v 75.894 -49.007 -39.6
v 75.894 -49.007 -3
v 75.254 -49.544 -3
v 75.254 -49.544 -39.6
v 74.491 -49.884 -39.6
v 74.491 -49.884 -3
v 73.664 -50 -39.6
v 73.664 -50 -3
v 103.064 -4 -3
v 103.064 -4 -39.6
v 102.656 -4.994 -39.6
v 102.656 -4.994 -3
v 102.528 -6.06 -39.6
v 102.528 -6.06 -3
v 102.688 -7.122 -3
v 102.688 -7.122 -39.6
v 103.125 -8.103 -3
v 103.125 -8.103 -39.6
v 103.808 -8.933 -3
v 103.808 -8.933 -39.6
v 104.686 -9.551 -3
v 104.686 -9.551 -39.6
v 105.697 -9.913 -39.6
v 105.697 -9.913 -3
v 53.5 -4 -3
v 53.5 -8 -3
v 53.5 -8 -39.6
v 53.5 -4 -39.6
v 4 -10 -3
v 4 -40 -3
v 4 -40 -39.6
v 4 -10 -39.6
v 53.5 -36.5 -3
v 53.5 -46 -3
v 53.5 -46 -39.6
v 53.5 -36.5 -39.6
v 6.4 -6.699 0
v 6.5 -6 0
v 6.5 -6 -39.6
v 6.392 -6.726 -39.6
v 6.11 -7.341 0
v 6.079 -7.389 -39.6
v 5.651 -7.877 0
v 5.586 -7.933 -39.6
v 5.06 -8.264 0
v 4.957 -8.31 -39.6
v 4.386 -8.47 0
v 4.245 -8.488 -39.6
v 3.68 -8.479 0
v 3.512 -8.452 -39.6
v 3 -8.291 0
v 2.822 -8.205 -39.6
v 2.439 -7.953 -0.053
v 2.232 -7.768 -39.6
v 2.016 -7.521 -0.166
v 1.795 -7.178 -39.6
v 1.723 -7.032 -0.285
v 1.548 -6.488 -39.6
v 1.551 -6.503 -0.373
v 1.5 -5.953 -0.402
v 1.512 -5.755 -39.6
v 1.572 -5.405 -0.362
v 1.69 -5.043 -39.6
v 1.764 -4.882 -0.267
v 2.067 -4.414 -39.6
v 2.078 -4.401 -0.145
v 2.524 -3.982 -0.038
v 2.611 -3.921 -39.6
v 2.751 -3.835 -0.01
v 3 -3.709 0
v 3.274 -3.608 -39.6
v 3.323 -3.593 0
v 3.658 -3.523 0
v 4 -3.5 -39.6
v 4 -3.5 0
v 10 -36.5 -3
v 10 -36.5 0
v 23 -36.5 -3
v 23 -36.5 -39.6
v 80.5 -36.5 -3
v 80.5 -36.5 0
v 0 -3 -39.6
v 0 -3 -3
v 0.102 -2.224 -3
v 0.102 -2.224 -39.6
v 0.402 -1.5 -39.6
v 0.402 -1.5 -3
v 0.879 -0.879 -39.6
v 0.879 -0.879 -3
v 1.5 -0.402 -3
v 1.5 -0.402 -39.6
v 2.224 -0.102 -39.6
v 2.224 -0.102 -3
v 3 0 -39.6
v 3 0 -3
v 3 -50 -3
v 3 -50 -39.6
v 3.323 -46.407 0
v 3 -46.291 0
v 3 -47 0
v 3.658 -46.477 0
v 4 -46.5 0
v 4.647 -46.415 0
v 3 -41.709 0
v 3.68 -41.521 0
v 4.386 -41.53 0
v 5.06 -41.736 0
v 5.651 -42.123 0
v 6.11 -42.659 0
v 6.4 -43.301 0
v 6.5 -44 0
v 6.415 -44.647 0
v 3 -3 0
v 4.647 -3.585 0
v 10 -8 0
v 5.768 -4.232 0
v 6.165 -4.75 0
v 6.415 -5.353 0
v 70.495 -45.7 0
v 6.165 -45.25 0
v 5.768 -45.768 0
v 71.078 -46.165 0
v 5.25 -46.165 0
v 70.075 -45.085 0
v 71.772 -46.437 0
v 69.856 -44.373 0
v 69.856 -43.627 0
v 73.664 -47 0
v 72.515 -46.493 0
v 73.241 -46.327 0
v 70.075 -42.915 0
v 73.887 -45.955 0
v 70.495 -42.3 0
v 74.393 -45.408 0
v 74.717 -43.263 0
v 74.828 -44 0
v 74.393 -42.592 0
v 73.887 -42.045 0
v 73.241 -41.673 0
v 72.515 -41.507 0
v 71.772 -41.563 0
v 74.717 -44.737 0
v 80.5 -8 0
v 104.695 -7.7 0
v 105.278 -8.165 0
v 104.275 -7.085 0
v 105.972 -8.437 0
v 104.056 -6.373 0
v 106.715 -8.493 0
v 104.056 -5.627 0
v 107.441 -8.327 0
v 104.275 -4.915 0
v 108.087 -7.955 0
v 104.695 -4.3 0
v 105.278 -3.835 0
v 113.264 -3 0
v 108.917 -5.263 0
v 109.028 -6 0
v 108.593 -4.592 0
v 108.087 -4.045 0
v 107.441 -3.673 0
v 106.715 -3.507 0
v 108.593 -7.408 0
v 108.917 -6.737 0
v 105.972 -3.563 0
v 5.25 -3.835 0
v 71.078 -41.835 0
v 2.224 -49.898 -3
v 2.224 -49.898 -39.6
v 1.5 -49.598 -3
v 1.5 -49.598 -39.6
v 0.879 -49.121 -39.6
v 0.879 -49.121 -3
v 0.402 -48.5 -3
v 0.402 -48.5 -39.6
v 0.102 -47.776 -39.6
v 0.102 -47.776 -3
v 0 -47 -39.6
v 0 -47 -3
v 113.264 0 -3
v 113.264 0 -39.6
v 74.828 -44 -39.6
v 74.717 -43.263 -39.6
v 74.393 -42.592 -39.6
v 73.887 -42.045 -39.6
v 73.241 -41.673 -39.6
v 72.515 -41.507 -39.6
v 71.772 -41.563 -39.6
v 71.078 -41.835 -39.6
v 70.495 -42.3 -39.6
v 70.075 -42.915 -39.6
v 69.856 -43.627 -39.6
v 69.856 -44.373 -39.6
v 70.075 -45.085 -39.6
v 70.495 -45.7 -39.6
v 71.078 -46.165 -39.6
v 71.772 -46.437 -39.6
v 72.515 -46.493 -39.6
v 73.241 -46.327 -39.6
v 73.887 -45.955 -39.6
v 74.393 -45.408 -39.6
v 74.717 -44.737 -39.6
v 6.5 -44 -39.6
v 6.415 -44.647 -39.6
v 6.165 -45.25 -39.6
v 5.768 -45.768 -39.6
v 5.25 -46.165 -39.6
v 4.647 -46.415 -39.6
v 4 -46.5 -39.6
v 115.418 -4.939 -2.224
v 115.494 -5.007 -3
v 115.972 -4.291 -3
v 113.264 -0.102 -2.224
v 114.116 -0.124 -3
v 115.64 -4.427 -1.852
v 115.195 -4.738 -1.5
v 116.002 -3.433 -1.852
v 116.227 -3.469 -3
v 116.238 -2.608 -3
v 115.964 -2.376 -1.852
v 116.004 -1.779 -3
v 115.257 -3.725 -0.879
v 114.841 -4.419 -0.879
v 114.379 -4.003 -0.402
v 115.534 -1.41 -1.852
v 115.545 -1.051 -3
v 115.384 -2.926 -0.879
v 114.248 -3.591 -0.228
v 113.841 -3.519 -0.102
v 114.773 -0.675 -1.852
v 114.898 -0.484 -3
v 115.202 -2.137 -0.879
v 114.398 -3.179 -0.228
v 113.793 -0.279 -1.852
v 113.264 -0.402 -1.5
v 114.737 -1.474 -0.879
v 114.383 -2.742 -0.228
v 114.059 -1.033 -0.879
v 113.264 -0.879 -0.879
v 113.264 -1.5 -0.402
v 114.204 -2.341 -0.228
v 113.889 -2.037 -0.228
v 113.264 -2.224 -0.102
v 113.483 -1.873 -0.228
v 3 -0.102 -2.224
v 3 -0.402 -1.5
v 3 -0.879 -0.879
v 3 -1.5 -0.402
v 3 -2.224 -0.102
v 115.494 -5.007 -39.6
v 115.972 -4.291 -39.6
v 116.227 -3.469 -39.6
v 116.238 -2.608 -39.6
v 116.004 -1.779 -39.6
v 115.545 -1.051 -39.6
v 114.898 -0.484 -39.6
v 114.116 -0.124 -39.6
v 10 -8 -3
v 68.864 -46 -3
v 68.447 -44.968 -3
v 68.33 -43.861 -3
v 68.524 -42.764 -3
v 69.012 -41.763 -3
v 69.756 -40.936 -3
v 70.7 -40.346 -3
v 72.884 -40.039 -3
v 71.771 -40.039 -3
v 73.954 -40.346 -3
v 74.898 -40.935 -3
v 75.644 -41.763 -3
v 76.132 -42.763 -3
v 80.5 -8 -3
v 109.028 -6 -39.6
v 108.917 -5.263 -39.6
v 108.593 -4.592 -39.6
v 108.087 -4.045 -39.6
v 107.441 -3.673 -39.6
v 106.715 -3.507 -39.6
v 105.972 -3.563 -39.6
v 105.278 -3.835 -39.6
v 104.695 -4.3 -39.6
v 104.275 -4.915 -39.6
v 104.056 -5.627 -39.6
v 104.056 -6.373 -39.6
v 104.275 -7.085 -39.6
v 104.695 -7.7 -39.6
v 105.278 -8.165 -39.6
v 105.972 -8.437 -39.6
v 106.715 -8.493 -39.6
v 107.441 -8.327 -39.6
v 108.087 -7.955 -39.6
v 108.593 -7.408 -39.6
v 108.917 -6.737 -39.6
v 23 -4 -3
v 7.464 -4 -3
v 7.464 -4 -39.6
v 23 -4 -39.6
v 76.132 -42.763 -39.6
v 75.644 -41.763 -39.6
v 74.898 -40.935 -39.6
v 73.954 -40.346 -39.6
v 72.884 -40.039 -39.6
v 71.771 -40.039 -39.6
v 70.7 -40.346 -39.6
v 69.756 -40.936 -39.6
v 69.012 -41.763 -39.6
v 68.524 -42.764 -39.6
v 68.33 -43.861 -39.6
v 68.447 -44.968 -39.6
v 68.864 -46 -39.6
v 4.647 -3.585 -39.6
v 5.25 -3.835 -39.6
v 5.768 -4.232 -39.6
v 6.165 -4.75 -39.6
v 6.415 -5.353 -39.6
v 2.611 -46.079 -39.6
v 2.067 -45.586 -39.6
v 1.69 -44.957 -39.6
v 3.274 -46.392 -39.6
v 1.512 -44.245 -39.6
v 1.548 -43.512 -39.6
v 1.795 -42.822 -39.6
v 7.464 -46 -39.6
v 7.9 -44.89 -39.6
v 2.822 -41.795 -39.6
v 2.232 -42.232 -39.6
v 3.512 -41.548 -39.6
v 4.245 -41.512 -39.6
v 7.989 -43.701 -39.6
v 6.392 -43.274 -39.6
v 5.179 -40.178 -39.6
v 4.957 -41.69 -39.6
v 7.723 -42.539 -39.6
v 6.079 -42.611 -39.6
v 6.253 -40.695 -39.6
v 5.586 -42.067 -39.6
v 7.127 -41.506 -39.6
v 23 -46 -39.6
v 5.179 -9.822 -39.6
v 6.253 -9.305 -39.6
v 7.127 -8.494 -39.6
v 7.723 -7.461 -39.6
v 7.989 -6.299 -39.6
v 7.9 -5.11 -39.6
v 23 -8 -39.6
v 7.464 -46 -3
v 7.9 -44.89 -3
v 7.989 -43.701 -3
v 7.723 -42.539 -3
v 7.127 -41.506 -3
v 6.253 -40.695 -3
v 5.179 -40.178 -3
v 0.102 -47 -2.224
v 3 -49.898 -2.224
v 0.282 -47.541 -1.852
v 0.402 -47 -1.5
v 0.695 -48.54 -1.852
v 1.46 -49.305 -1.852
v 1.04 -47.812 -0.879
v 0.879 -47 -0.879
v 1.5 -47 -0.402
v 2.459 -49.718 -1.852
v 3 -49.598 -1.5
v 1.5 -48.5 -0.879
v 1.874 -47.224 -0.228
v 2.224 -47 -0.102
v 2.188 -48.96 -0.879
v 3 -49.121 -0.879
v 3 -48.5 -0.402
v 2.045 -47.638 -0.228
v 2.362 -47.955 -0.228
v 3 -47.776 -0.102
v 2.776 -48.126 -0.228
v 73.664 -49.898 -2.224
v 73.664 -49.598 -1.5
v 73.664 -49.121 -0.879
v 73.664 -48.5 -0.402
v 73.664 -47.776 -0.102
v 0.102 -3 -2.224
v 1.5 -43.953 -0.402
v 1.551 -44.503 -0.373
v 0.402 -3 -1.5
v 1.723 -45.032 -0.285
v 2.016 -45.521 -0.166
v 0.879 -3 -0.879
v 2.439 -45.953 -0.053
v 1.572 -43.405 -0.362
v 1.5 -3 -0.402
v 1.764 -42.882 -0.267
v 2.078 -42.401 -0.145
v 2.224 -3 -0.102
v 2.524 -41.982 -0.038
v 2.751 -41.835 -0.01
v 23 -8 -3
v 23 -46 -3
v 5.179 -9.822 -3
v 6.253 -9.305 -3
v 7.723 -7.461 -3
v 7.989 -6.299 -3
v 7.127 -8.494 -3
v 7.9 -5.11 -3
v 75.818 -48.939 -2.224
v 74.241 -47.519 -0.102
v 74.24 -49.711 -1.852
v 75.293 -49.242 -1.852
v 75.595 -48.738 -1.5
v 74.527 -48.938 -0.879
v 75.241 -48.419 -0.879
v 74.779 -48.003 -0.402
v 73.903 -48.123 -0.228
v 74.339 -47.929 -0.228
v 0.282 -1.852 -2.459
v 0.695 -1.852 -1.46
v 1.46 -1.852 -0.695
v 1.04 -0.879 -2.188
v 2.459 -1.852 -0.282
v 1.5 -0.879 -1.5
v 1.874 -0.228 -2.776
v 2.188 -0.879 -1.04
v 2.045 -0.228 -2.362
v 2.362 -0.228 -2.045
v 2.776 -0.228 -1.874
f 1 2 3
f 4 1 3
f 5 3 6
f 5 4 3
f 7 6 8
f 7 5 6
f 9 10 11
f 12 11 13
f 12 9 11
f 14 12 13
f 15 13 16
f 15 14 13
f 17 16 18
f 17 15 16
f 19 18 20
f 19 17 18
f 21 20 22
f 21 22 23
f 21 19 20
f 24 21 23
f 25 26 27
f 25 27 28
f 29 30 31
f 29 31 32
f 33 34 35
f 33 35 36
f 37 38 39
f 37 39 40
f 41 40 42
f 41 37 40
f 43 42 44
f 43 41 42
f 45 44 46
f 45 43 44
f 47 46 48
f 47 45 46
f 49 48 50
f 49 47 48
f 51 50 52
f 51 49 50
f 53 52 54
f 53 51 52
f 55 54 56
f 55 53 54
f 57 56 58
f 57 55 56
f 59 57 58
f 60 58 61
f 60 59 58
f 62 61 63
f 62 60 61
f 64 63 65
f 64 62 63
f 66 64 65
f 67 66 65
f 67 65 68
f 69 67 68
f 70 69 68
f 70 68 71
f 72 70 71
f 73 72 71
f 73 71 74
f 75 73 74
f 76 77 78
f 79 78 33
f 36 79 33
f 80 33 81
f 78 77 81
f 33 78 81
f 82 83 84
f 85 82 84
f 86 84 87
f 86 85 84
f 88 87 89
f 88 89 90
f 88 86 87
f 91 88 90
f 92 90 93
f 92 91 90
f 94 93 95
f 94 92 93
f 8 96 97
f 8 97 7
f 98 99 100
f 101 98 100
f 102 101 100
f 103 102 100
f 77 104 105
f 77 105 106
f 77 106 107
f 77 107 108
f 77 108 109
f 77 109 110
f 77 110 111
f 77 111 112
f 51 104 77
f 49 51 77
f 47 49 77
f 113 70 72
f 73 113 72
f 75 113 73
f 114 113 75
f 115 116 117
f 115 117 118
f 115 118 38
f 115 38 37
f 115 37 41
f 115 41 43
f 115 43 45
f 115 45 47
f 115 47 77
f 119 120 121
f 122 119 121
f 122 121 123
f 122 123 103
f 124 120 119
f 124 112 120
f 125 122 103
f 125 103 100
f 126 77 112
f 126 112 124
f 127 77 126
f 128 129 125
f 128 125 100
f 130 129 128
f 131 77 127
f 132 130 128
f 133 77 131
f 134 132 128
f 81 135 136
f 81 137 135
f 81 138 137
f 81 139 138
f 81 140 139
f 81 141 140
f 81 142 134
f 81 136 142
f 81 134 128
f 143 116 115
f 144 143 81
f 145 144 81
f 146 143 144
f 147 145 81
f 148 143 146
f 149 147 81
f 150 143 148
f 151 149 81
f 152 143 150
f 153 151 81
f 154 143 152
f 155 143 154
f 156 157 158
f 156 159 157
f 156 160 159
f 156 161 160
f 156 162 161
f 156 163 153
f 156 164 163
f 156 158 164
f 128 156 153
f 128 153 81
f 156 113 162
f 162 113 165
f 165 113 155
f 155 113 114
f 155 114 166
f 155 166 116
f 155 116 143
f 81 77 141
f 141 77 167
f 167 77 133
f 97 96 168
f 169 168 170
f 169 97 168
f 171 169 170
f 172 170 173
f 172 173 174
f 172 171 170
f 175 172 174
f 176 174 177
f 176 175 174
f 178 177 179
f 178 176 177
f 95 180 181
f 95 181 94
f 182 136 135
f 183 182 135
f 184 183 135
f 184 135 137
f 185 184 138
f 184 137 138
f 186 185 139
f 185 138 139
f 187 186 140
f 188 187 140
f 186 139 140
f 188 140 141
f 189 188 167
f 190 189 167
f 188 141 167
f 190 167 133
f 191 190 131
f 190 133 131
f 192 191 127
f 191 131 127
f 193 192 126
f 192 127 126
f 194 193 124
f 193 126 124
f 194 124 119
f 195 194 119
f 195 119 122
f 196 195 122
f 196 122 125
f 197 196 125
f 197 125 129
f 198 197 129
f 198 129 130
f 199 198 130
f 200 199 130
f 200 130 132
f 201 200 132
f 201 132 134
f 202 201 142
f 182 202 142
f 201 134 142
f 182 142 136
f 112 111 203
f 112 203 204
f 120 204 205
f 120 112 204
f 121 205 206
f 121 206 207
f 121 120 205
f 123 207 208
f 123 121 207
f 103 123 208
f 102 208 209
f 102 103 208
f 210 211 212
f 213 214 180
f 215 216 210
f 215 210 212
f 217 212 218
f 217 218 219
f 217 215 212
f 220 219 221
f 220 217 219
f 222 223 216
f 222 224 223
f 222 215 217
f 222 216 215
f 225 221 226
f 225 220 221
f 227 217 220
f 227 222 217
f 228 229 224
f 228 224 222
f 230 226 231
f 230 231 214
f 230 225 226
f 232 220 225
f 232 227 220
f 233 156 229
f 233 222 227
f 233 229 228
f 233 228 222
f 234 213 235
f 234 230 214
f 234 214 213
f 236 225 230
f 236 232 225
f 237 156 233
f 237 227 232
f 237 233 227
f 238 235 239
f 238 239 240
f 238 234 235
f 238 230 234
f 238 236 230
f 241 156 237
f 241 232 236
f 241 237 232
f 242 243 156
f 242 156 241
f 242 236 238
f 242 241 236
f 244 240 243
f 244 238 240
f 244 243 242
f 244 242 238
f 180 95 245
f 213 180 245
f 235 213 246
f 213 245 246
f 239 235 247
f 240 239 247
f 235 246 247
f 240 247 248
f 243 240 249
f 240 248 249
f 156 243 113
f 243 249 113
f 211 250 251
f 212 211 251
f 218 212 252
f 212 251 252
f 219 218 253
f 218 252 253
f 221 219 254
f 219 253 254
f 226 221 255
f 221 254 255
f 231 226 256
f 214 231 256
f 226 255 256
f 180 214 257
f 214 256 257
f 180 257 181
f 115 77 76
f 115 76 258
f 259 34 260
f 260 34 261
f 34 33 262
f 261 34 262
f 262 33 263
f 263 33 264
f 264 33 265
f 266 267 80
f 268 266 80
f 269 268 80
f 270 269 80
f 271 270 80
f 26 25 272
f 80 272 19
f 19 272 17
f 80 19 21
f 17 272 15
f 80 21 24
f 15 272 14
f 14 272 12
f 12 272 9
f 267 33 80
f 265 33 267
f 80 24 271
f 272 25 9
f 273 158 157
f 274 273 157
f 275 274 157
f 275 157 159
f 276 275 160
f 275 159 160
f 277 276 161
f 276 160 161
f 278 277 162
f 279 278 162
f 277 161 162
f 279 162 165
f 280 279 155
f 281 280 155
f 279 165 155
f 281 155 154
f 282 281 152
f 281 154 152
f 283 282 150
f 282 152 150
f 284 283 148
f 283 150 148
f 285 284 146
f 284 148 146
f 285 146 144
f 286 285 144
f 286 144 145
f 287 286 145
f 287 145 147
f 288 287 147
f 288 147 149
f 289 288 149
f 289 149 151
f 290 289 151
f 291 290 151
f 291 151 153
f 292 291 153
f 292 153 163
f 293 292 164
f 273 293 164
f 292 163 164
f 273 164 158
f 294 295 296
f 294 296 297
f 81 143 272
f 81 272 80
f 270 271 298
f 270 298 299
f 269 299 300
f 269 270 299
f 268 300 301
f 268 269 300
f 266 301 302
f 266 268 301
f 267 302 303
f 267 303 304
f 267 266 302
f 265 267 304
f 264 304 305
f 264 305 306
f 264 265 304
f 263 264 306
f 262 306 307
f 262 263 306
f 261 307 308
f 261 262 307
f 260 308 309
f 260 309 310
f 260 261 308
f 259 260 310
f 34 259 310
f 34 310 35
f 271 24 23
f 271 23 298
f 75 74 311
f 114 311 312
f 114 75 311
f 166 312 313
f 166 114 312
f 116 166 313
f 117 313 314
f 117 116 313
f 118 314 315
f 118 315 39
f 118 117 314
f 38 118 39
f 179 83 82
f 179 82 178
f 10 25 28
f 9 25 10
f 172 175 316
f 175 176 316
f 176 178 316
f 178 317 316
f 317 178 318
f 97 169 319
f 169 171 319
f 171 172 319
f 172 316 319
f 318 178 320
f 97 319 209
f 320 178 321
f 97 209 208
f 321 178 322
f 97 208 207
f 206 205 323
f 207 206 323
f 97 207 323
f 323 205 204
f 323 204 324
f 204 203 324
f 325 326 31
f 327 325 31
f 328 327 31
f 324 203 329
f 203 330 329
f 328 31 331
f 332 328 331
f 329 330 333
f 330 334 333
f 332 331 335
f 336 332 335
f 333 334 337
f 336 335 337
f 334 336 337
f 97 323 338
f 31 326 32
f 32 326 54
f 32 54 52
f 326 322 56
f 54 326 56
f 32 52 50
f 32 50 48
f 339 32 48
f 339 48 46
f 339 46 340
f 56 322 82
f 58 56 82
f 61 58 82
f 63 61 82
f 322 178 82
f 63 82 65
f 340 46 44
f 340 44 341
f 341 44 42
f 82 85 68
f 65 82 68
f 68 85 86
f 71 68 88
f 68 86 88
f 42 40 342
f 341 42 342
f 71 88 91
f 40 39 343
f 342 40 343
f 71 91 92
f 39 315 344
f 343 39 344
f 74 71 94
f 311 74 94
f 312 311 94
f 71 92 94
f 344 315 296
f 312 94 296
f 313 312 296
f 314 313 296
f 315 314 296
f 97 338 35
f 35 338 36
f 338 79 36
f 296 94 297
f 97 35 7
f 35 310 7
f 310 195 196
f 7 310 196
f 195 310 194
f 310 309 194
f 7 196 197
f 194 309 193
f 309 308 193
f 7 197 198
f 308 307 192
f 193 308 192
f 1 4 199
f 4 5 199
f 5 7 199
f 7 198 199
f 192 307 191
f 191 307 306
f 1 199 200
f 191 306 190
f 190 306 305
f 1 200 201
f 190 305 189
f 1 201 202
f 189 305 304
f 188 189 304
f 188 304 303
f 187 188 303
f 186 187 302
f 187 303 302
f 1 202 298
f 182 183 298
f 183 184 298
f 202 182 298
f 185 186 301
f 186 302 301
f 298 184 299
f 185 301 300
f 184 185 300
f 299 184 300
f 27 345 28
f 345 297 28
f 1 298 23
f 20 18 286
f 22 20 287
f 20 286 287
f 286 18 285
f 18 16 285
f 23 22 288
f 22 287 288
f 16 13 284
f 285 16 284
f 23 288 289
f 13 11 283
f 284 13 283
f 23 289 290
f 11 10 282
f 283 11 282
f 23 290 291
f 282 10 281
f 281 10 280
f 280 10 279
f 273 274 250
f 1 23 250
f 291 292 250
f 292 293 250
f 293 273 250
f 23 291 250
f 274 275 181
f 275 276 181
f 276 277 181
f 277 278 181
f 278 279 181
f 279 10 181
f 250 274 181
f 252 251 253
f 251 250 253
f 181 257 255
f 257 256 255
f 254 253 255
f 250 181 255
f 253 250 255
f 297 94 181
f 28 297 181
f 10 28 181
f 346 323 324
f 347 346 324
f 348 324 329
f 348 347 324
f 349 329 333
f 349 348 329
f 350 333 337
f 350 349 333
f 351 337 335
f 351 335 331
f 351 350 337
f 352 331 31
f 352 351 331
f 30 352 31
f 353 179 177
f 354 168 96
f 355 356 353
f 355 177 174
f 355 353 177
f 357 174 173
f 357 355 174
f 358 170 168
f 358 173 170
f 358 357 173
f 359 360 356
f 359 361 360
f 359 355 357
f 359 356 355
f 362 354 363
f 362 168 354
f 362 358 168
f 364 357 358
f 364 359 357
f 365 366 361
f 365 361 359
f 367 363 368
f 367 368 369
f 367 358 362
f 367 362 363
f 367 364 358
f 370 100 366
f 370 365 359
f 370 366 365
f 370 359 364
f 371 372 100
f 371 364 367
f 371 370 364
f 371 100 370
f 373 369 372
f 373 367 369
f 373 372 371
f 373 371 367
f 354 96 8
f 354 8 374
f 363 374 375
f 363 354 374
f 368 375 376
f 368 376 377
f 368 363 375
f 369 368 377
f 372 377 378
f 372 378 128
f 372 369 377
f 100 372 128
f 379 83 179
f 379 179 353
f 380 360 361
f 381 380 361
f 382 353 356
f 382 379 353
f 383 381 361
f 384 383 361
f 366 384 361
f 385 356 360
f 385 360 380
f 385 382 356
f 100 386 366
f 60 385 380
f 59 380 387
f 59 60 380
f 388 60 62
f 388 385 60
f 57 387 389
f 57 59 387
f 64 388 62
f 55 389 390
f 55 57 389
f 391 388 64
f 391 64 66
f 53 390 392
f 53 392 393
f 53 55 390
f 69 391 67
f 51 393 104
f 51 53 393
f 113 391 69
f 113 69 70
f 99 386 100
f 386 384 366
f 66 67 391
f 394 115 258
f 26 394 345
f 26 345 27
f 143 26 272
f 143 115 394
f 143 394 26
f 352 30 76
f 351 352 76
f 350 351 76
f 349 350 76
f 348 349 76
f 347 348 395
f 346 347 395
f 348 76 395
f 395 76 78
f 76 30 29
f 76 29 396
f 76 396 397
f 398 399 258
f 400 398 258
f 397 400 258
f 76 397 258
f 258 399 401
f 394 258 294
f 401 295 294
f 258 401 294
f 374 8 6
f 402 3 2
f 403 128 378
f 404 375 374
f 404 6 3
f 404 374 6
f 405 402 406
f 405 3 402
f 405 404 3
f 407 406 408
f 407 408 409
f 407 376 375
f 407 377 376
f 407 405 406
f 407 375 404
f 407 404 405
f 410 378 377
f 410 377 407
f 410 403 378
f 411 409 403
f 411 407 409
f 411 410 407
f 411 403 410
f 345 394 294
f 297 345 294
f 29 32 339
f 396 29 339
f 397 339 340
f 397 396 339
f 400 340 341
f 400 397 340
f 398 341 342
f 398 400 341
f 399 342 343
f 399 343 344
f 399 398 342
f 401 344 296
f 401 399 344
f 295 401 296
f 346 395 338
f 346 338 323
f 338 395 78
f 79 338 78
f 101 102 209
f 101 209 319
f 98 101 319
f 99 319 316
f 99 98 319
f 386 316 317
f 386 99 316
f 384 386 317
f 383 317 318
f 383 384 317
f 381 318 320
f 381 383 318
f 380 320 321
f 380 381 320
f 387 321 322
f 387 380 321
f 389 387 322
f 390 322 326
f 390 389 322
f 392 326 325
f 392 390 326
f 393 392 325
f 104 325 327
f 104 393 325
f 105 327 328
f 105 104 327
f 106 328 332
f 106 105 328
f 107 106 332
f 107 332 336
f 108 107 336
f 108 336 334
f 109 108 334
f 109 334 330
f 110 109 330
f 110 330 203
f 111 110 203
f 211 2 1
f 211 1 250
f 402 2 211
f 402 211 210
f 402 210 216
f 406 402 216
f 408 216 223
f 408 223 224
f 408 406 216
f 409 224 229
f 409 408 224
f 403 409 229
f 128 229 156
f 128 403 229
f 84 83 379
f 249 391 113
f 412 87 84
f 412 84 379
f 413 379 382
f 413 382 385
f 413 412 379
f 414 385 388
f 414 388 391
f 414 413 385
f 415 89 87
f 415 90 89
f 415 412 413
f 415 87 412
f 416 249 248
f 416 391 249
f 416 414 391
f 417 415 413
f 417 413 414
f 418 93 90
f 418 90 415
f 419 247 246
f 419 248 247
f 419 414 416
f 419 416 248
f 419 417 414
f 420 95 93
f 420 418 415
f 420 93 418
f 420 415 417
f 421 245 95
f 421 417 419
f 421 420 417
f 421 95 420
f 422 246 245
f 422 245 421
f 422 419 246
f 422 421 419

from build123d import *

# Parameters (mm, degrees)
F1_DEPTH     = 3
F0_R         = 2.5
F0_W         = 30.5
F0_H         = 9.5
F0_H_2       = 4
F2_DEPTH     = 39.6
F3_T1_DEPTH  = 70.6639127859
F3_T3_DEPTH  = 44.1
F3_T5_DEPTH  = 39.9402180353
F3_T7_DEPTH  = 59.1959458071
F3_T9_DEPTH  = 53.4402180353
F3_T11_DEPTH = 110.2639127859
F3_T13_DEPTH = 44
F3_S17_W     = 3
F3_S17_H     = 3
F3_T18_DEPTH = 3
F3_T24_DEPTH = 3
F3_T30_DEPTH = 3
F3_S35_W     = 3
F3_S35_H     = 3
F3_T36_DEPTH = 3


# Not quite as in the source:
# - a fillet or chamfer that OpenCascade refuses, or shapes differently, is made with other operations: its cross-section is extruded or revolved along the edge and cut away or added


with BuildPart() as f1:
    # F0 (on Top) → F1 (new body)
    with BuildSketch(Plane.XY):
        with BuildLine():
            Line((10, -36.5), (10, -8))
            Line((10, -8), (23, -8))
            Line((23, -8), (23, -4))
            Line((23, -4), (7.4641016151, -4))
            ThreePointArc((7.4641016151, -4), (7.4641016151, -8), (4, -10))
            Line((4, -10), (4, -40))
            ThreePointArc((4, -40), (7.4641016151, -42), (7.4641016151, -46))
            Line((7.4641016151, -46), (23, -46))
            Line((23, -46), (23, -36.5))
            Line((23, -36.5), (10, -36.5))
        make_face()
    extrude(amount=-F1_DEPTH)



with BuildPart() as f1b:
    # F0 (on Top) → F1, piece 2 (new body)
    with BuildSketch(Plane.XY):
        with BuildLine():
            Line((53.5, -4), (53.5, -8))
            Line((53.5, -8), (80.5, -8))
            Line((80.5, -8), (80.5, -36.5))
            Line((80.5, -36.5), (53.5, -36.5))
            Line((53.5, -36.5), (53.5, -46))
            Line((53.5, -46), (68.8637239566, -46))
            ThreePointArc((68.8637239566, -46), (70.700471232, -40.3459997464), (76.1317756715, -42.7630830107))
            Line((76.1317756715, -42.7630830107), (105.697052057, -9.9127759158))
            ThreePointArc((105.697052057, -9.9127759158), (102.8738253182, -7.6273543397), (103.0637239566, -4))
            Line((103.0637239566, -4), (53.5, -4))
        make_face()
    extrude(amount=-F1_DEPTH)


with BuildPart() as f1_1:
    add(f1.part)

    add(f1b.part)  # F2 merges F1b
    # F0 (on Top) → F2 (join)
    with BuildSketch(Plane.XY):
        Polygon((120, 0), (0, 0), (0, -50), (75, -50), align=None)
        with BuildLine():
            ThreePointArc((4, -46.5), (2.232233047, -42.232233047), (6.5, -44))
            ThreePointArc((6.5, -44), (5.767766953, -45.767766953), (4, -46.5))
        make_face(mode=Mode.SUBTRACT)
        with BuildLine():
            Line((7.4641016151, -4), (23, -4))
            Line((23, -4), (53.5, -4))
            Line((53.5, -4), (103.0637239566, -4))
            ThreePointArc((103.0637239566, -4), (102.8738253182, -7.6273543397), (105.697052057, -9.9127759158))
            Line((105.697052057, -9.9127759158), (76.1317756715, -42.7630830107))
            ThreePointArc((76.1317756715, -42.7630830107), (70.700471232, -40.3459997464), (68.8637239566, -46))
            Line((68.8637239566, -46), (53.5, -46))
            Line((53.5, -46), (23, -46))
            Line((23, -46), (7.4641016151, -46))
            ThreePointArc((7.4641016151, -46), (7.4641016151, -42), (4, -40))
            Line((4, -40), (4, -10))
            ThreePointArc((4, -10), (7.4641016151, -8), (7.4641016151, -4))
        make_face(mode=Mode.SUBTRACT)
        with Locations((72.3278255718, -44)):
            Circle(F0_R, mode=Mode.SUBTRACT)
        with BuildLine():
            ThreePointArc((4, -3.5), (5.767766953, -4.232233047), (6.5, -6))
            ThreePointArc((6.5, -6), (2.232233047, -7.767766953), (4, -3.5))
        make_face(mode=Mode.SUBTRACT)
        with Locations((106.5278255718, -6)):
            Circle(F0_R, mode=Mode.SUBTRACT)
        with Locations((38.25, -41.25)):
            Rectangle(F0_W, F0_H)
        with Locations((38.25, -6)):
            Rectangle(F0_W, F0_H_2)
    extrude(amount=-F2_DEPTH)

    # F3: fillet of radius 3 on 8 edges, made by hand

    # F3_s2 → F3_t1 (cut)
    with BuildSketch(Plane.YZ.offset(3)):
        with BuildLine():
            ThreePointArc((-50, -3), (-49.1213203436, -0.8786796564), (-47, 0))
            Line((-47, 0), (-50, 0))
            Line((-50, 0), (-50, -3))
        make_face()
    extrude(amount=F3_T1_DEPTH, mode=Mode.SUBTRACT)

    # F3_s4 → F3_t3 (cut)
    with BuildSketch(Plane.XY.offset(-47.1)):
        with BuildLine():
            ThreePointArc((3, -50), (0.8786796564, -49.1213203436), (0, -47))
            Line((0, -47), (0, -50))
            Line((0, -50), (3, -50))
        make_face()
        with BuildLine():
            ThreePointArc((0, -3), (0.8786796564, -0.8786796564), (3, 0))
            Line((3, 0), (0, 0))
            Line((0, 0), (0, -3))
        make_face()
    extrude(amount=F3_T3_DEPTH, mode=Mode.SUBTRACT)

    # F3_s6 → F3_t5 (cut)
    with BuildSketch(Plane.XY.offset(-42.9402180353)):
        with BuildLine():
            ThreePointArc((75.8937952246, -49.0068941949), (74.8844285407, -49.7405001902), (73.6639127859, -50))
            Line((73.6639127859, -50), (75, -50))
            Line((75, -50), (75.8937952246, -49.0068941949))
        make_face()
    extrude(amount=F3_T5_DEPTH, mode=Mode.SUBTRACT)

    # F3_s8 → F3_t7 (cut)
    with BuildSketch(Plane(origin=(9.5954526832, 10.6616140924, 0), x_dir=(0, 0, 1), z_dir=(0.6689647316, 0.7432941462, 0))):
        with BuildLine():
            ThreePointArc((-3, 89.1952975497), (-0.8786796564, 88.3166178932), (0, 86.1952975497))
            Line((0, 86.1952975497), (0, 89.1952975497))
            Line((0, 89.1952975497), (-3, 89.1952975497))
        make_face()
    extrude(amount=F3_T7_DEPTH, mode=Mode.SUBTRACT)

    # F3_s10 → F3_t9 (cut)
    with BuildSketch(Plane.XY.offset(-56.4402180353)):
        with BuildLine():
            ThreePointArc((115.4937952246, -5.0068941949), (116.004412976, -1.7794842452), (113.2639127859, 0))
            Line((113.2639127859, 0), (120, 0))
            Line((120, 0), (115.4937952246, -5.0068941949))
        make_face()
    extrude(amount=F3_T9_DEPTH, mode=Mode.SUBTRACT)

    # F3_s12 → F3_t11 (cut)
    with BuildSketch(Plane.YZ.offset(3)):
        with BuildLine():
            ThreePointArc((0, -3), (-0.8786796564, -0.8786796564), (-3, 0))
            Line((-3, 0), (0, 0))
            Line((0, 0), (0, -3))
        make_face()
    extrude(amount=F3_T11_DEPTH, mode=Mode.SUBTRACT)

    # F3_s14 → F3_t13 (cut)
    with BuildSketch(Plane.XZ.offset(3)):
        with BuildLine():
            ThreePointArc((0, -3), (0.8786796564, -0.8786796564), (3, 0))
            Line((3, 0), (0, 0))
            Line((0, 0), (0, -3))
        make_face()
    extrude(amount=F3_T13_DEPTH, mode=Mode.SUBTRACT)


with BuildPart() as f3_tool16:
    # F3_s17 → F3_t18 (new body)
    with BuildSketch(Plane.XY.offset(-3)):
        with Locations((1.5, -48.5)):
            Rectangle(F3_S17_W, F3_S17_H)
    extrude(amount=F3_T18_DEPTH)

    # F3_s19 → F3_t20 (revolve, cut)
    with BuildSketch(Plane(origin=(3, -47, -3), x_dir=(0.7071067812, 0.7071067812, 0), z_dir=(0.7071067812, -0.7071067812, 0))):
        with BuildLine():
            ThreePointArc((0, -3), (3, 0), (0, 3))
            Line((0, 3), (0, -3))
        make_face()
    revolve(axis=Axis((3, -47, -3), (0, 0, 1)), mode=Mode.SUBTRACT)


with BuildPart() as f1_2:
    add(f1_1.part)

    # F3_t15: cut F3_tool16
    add(f3_tool16.part, mode=Mode.SUBTRACT)


with BuildPart() as f3_tool22:
    # F3_s23 → F3_t24 (new body)
    with BuildSketch(Plane.XY.offset(-3)):
        Polygon((73.6639127859, -47), (75.8937952246, -49.0068941949), (75, -50), (73.6639127859, -50), align=None)
    extrude(amount=F3_T24_DEPTH)

    # F3_s25 → F3_t26 (revolve, cut)
    with BuildSketch(Plane(origin=(73.6639127859, -47, -3), x_dir=(-0.4068385849, 0.9135000634, 0), z_dir=(0.9135000634, 0.4068385849, 0))):
        with BuildLine():
            ThreePointArc((0, -3), (3, 0), (0, 3))
            Line((0, 3), (0, -3))
        make_face()
    revolve(axis=Axis((73.6639127859, -47, -3), (0, 0, 1)), mode=Mode.SUBTRACT)


with BuildPart() as f1_3:
    add(f1_2.part)

    # F3_t21: cut F3_tool22
    add(f3_tool22.part, mode=Mode.SUBTRACT)


with BuildPart() as f3_tool28:
    # F3_s29 → F3_t30 (new body)
    with BuildSketch(Plane.XY.offset(-3)):
        Polygon((113.2639127859, -3), (115.4937952246, -5.0068941949), (120, 0), (113.2639127859, 0), align=None)
    extrude(amount=F3_T30_DEPTH)

    # F3_s31 → F3_t32 (revolve, cut)
    with BuildSketch(Plane(origin=(113.2639127859, -3, -3), x_dir=(-0.9135000634, -0.4068385849, 0), z_dir=(-0.4068385849, 0.9135000634, 0))):
        with BuildLine():
            ThreePointArc((0, -3), (3, 0), (0, 3))
            Line((0, 3), (0, -3))
        make_face()
    revolve(axis=Axis((113.2639127859, -3, -3), (0, 0, 1)), mode=Mode.SUBTRACT)


with BuildPart() as f1_4:
    add(f1_3.part)

    # F3_t27: cut F3_tool28
    add(f3_tool28.part, mode=Mode.SUBTRACT)


with BuildPart() as f3_tool34:
    # F3_s35 → F3_t36 (new body)
    with BuildSketch(Plane.XZ.offset(3)):
        with Locations((1.5, -1.5)):
            Rectangle(F3_S35_W, F3_S35_H)
    extrude(amount=-F3_T36_DEPTH)

    # F3_s37 → F3_t38 (revolve, cut)
    with BuildSketch(Plane(origin=(3, -3, -3), x_dir=(0.7071067812, 0, -0.7071067812), z_dir=(0.7071067812, 0, 0.7071067812))):
        with BuildLine():
            ThreePointArc((0, -3), (3, 0), (0, 3))
            Line((0, 3), (0, -3))
        make_face()
    revolve(axis=Axis((3, -3, -3), (0, 1, 0)), mode=Mode.SUBTRACT)


with BuildPart() as f1_5:
    add(f1_4.part)

    # F3_t33: cut F3_tool34
    add(f3_tool34.part, mode=Mode.SUBTRACT)


solid = f1_5.part
